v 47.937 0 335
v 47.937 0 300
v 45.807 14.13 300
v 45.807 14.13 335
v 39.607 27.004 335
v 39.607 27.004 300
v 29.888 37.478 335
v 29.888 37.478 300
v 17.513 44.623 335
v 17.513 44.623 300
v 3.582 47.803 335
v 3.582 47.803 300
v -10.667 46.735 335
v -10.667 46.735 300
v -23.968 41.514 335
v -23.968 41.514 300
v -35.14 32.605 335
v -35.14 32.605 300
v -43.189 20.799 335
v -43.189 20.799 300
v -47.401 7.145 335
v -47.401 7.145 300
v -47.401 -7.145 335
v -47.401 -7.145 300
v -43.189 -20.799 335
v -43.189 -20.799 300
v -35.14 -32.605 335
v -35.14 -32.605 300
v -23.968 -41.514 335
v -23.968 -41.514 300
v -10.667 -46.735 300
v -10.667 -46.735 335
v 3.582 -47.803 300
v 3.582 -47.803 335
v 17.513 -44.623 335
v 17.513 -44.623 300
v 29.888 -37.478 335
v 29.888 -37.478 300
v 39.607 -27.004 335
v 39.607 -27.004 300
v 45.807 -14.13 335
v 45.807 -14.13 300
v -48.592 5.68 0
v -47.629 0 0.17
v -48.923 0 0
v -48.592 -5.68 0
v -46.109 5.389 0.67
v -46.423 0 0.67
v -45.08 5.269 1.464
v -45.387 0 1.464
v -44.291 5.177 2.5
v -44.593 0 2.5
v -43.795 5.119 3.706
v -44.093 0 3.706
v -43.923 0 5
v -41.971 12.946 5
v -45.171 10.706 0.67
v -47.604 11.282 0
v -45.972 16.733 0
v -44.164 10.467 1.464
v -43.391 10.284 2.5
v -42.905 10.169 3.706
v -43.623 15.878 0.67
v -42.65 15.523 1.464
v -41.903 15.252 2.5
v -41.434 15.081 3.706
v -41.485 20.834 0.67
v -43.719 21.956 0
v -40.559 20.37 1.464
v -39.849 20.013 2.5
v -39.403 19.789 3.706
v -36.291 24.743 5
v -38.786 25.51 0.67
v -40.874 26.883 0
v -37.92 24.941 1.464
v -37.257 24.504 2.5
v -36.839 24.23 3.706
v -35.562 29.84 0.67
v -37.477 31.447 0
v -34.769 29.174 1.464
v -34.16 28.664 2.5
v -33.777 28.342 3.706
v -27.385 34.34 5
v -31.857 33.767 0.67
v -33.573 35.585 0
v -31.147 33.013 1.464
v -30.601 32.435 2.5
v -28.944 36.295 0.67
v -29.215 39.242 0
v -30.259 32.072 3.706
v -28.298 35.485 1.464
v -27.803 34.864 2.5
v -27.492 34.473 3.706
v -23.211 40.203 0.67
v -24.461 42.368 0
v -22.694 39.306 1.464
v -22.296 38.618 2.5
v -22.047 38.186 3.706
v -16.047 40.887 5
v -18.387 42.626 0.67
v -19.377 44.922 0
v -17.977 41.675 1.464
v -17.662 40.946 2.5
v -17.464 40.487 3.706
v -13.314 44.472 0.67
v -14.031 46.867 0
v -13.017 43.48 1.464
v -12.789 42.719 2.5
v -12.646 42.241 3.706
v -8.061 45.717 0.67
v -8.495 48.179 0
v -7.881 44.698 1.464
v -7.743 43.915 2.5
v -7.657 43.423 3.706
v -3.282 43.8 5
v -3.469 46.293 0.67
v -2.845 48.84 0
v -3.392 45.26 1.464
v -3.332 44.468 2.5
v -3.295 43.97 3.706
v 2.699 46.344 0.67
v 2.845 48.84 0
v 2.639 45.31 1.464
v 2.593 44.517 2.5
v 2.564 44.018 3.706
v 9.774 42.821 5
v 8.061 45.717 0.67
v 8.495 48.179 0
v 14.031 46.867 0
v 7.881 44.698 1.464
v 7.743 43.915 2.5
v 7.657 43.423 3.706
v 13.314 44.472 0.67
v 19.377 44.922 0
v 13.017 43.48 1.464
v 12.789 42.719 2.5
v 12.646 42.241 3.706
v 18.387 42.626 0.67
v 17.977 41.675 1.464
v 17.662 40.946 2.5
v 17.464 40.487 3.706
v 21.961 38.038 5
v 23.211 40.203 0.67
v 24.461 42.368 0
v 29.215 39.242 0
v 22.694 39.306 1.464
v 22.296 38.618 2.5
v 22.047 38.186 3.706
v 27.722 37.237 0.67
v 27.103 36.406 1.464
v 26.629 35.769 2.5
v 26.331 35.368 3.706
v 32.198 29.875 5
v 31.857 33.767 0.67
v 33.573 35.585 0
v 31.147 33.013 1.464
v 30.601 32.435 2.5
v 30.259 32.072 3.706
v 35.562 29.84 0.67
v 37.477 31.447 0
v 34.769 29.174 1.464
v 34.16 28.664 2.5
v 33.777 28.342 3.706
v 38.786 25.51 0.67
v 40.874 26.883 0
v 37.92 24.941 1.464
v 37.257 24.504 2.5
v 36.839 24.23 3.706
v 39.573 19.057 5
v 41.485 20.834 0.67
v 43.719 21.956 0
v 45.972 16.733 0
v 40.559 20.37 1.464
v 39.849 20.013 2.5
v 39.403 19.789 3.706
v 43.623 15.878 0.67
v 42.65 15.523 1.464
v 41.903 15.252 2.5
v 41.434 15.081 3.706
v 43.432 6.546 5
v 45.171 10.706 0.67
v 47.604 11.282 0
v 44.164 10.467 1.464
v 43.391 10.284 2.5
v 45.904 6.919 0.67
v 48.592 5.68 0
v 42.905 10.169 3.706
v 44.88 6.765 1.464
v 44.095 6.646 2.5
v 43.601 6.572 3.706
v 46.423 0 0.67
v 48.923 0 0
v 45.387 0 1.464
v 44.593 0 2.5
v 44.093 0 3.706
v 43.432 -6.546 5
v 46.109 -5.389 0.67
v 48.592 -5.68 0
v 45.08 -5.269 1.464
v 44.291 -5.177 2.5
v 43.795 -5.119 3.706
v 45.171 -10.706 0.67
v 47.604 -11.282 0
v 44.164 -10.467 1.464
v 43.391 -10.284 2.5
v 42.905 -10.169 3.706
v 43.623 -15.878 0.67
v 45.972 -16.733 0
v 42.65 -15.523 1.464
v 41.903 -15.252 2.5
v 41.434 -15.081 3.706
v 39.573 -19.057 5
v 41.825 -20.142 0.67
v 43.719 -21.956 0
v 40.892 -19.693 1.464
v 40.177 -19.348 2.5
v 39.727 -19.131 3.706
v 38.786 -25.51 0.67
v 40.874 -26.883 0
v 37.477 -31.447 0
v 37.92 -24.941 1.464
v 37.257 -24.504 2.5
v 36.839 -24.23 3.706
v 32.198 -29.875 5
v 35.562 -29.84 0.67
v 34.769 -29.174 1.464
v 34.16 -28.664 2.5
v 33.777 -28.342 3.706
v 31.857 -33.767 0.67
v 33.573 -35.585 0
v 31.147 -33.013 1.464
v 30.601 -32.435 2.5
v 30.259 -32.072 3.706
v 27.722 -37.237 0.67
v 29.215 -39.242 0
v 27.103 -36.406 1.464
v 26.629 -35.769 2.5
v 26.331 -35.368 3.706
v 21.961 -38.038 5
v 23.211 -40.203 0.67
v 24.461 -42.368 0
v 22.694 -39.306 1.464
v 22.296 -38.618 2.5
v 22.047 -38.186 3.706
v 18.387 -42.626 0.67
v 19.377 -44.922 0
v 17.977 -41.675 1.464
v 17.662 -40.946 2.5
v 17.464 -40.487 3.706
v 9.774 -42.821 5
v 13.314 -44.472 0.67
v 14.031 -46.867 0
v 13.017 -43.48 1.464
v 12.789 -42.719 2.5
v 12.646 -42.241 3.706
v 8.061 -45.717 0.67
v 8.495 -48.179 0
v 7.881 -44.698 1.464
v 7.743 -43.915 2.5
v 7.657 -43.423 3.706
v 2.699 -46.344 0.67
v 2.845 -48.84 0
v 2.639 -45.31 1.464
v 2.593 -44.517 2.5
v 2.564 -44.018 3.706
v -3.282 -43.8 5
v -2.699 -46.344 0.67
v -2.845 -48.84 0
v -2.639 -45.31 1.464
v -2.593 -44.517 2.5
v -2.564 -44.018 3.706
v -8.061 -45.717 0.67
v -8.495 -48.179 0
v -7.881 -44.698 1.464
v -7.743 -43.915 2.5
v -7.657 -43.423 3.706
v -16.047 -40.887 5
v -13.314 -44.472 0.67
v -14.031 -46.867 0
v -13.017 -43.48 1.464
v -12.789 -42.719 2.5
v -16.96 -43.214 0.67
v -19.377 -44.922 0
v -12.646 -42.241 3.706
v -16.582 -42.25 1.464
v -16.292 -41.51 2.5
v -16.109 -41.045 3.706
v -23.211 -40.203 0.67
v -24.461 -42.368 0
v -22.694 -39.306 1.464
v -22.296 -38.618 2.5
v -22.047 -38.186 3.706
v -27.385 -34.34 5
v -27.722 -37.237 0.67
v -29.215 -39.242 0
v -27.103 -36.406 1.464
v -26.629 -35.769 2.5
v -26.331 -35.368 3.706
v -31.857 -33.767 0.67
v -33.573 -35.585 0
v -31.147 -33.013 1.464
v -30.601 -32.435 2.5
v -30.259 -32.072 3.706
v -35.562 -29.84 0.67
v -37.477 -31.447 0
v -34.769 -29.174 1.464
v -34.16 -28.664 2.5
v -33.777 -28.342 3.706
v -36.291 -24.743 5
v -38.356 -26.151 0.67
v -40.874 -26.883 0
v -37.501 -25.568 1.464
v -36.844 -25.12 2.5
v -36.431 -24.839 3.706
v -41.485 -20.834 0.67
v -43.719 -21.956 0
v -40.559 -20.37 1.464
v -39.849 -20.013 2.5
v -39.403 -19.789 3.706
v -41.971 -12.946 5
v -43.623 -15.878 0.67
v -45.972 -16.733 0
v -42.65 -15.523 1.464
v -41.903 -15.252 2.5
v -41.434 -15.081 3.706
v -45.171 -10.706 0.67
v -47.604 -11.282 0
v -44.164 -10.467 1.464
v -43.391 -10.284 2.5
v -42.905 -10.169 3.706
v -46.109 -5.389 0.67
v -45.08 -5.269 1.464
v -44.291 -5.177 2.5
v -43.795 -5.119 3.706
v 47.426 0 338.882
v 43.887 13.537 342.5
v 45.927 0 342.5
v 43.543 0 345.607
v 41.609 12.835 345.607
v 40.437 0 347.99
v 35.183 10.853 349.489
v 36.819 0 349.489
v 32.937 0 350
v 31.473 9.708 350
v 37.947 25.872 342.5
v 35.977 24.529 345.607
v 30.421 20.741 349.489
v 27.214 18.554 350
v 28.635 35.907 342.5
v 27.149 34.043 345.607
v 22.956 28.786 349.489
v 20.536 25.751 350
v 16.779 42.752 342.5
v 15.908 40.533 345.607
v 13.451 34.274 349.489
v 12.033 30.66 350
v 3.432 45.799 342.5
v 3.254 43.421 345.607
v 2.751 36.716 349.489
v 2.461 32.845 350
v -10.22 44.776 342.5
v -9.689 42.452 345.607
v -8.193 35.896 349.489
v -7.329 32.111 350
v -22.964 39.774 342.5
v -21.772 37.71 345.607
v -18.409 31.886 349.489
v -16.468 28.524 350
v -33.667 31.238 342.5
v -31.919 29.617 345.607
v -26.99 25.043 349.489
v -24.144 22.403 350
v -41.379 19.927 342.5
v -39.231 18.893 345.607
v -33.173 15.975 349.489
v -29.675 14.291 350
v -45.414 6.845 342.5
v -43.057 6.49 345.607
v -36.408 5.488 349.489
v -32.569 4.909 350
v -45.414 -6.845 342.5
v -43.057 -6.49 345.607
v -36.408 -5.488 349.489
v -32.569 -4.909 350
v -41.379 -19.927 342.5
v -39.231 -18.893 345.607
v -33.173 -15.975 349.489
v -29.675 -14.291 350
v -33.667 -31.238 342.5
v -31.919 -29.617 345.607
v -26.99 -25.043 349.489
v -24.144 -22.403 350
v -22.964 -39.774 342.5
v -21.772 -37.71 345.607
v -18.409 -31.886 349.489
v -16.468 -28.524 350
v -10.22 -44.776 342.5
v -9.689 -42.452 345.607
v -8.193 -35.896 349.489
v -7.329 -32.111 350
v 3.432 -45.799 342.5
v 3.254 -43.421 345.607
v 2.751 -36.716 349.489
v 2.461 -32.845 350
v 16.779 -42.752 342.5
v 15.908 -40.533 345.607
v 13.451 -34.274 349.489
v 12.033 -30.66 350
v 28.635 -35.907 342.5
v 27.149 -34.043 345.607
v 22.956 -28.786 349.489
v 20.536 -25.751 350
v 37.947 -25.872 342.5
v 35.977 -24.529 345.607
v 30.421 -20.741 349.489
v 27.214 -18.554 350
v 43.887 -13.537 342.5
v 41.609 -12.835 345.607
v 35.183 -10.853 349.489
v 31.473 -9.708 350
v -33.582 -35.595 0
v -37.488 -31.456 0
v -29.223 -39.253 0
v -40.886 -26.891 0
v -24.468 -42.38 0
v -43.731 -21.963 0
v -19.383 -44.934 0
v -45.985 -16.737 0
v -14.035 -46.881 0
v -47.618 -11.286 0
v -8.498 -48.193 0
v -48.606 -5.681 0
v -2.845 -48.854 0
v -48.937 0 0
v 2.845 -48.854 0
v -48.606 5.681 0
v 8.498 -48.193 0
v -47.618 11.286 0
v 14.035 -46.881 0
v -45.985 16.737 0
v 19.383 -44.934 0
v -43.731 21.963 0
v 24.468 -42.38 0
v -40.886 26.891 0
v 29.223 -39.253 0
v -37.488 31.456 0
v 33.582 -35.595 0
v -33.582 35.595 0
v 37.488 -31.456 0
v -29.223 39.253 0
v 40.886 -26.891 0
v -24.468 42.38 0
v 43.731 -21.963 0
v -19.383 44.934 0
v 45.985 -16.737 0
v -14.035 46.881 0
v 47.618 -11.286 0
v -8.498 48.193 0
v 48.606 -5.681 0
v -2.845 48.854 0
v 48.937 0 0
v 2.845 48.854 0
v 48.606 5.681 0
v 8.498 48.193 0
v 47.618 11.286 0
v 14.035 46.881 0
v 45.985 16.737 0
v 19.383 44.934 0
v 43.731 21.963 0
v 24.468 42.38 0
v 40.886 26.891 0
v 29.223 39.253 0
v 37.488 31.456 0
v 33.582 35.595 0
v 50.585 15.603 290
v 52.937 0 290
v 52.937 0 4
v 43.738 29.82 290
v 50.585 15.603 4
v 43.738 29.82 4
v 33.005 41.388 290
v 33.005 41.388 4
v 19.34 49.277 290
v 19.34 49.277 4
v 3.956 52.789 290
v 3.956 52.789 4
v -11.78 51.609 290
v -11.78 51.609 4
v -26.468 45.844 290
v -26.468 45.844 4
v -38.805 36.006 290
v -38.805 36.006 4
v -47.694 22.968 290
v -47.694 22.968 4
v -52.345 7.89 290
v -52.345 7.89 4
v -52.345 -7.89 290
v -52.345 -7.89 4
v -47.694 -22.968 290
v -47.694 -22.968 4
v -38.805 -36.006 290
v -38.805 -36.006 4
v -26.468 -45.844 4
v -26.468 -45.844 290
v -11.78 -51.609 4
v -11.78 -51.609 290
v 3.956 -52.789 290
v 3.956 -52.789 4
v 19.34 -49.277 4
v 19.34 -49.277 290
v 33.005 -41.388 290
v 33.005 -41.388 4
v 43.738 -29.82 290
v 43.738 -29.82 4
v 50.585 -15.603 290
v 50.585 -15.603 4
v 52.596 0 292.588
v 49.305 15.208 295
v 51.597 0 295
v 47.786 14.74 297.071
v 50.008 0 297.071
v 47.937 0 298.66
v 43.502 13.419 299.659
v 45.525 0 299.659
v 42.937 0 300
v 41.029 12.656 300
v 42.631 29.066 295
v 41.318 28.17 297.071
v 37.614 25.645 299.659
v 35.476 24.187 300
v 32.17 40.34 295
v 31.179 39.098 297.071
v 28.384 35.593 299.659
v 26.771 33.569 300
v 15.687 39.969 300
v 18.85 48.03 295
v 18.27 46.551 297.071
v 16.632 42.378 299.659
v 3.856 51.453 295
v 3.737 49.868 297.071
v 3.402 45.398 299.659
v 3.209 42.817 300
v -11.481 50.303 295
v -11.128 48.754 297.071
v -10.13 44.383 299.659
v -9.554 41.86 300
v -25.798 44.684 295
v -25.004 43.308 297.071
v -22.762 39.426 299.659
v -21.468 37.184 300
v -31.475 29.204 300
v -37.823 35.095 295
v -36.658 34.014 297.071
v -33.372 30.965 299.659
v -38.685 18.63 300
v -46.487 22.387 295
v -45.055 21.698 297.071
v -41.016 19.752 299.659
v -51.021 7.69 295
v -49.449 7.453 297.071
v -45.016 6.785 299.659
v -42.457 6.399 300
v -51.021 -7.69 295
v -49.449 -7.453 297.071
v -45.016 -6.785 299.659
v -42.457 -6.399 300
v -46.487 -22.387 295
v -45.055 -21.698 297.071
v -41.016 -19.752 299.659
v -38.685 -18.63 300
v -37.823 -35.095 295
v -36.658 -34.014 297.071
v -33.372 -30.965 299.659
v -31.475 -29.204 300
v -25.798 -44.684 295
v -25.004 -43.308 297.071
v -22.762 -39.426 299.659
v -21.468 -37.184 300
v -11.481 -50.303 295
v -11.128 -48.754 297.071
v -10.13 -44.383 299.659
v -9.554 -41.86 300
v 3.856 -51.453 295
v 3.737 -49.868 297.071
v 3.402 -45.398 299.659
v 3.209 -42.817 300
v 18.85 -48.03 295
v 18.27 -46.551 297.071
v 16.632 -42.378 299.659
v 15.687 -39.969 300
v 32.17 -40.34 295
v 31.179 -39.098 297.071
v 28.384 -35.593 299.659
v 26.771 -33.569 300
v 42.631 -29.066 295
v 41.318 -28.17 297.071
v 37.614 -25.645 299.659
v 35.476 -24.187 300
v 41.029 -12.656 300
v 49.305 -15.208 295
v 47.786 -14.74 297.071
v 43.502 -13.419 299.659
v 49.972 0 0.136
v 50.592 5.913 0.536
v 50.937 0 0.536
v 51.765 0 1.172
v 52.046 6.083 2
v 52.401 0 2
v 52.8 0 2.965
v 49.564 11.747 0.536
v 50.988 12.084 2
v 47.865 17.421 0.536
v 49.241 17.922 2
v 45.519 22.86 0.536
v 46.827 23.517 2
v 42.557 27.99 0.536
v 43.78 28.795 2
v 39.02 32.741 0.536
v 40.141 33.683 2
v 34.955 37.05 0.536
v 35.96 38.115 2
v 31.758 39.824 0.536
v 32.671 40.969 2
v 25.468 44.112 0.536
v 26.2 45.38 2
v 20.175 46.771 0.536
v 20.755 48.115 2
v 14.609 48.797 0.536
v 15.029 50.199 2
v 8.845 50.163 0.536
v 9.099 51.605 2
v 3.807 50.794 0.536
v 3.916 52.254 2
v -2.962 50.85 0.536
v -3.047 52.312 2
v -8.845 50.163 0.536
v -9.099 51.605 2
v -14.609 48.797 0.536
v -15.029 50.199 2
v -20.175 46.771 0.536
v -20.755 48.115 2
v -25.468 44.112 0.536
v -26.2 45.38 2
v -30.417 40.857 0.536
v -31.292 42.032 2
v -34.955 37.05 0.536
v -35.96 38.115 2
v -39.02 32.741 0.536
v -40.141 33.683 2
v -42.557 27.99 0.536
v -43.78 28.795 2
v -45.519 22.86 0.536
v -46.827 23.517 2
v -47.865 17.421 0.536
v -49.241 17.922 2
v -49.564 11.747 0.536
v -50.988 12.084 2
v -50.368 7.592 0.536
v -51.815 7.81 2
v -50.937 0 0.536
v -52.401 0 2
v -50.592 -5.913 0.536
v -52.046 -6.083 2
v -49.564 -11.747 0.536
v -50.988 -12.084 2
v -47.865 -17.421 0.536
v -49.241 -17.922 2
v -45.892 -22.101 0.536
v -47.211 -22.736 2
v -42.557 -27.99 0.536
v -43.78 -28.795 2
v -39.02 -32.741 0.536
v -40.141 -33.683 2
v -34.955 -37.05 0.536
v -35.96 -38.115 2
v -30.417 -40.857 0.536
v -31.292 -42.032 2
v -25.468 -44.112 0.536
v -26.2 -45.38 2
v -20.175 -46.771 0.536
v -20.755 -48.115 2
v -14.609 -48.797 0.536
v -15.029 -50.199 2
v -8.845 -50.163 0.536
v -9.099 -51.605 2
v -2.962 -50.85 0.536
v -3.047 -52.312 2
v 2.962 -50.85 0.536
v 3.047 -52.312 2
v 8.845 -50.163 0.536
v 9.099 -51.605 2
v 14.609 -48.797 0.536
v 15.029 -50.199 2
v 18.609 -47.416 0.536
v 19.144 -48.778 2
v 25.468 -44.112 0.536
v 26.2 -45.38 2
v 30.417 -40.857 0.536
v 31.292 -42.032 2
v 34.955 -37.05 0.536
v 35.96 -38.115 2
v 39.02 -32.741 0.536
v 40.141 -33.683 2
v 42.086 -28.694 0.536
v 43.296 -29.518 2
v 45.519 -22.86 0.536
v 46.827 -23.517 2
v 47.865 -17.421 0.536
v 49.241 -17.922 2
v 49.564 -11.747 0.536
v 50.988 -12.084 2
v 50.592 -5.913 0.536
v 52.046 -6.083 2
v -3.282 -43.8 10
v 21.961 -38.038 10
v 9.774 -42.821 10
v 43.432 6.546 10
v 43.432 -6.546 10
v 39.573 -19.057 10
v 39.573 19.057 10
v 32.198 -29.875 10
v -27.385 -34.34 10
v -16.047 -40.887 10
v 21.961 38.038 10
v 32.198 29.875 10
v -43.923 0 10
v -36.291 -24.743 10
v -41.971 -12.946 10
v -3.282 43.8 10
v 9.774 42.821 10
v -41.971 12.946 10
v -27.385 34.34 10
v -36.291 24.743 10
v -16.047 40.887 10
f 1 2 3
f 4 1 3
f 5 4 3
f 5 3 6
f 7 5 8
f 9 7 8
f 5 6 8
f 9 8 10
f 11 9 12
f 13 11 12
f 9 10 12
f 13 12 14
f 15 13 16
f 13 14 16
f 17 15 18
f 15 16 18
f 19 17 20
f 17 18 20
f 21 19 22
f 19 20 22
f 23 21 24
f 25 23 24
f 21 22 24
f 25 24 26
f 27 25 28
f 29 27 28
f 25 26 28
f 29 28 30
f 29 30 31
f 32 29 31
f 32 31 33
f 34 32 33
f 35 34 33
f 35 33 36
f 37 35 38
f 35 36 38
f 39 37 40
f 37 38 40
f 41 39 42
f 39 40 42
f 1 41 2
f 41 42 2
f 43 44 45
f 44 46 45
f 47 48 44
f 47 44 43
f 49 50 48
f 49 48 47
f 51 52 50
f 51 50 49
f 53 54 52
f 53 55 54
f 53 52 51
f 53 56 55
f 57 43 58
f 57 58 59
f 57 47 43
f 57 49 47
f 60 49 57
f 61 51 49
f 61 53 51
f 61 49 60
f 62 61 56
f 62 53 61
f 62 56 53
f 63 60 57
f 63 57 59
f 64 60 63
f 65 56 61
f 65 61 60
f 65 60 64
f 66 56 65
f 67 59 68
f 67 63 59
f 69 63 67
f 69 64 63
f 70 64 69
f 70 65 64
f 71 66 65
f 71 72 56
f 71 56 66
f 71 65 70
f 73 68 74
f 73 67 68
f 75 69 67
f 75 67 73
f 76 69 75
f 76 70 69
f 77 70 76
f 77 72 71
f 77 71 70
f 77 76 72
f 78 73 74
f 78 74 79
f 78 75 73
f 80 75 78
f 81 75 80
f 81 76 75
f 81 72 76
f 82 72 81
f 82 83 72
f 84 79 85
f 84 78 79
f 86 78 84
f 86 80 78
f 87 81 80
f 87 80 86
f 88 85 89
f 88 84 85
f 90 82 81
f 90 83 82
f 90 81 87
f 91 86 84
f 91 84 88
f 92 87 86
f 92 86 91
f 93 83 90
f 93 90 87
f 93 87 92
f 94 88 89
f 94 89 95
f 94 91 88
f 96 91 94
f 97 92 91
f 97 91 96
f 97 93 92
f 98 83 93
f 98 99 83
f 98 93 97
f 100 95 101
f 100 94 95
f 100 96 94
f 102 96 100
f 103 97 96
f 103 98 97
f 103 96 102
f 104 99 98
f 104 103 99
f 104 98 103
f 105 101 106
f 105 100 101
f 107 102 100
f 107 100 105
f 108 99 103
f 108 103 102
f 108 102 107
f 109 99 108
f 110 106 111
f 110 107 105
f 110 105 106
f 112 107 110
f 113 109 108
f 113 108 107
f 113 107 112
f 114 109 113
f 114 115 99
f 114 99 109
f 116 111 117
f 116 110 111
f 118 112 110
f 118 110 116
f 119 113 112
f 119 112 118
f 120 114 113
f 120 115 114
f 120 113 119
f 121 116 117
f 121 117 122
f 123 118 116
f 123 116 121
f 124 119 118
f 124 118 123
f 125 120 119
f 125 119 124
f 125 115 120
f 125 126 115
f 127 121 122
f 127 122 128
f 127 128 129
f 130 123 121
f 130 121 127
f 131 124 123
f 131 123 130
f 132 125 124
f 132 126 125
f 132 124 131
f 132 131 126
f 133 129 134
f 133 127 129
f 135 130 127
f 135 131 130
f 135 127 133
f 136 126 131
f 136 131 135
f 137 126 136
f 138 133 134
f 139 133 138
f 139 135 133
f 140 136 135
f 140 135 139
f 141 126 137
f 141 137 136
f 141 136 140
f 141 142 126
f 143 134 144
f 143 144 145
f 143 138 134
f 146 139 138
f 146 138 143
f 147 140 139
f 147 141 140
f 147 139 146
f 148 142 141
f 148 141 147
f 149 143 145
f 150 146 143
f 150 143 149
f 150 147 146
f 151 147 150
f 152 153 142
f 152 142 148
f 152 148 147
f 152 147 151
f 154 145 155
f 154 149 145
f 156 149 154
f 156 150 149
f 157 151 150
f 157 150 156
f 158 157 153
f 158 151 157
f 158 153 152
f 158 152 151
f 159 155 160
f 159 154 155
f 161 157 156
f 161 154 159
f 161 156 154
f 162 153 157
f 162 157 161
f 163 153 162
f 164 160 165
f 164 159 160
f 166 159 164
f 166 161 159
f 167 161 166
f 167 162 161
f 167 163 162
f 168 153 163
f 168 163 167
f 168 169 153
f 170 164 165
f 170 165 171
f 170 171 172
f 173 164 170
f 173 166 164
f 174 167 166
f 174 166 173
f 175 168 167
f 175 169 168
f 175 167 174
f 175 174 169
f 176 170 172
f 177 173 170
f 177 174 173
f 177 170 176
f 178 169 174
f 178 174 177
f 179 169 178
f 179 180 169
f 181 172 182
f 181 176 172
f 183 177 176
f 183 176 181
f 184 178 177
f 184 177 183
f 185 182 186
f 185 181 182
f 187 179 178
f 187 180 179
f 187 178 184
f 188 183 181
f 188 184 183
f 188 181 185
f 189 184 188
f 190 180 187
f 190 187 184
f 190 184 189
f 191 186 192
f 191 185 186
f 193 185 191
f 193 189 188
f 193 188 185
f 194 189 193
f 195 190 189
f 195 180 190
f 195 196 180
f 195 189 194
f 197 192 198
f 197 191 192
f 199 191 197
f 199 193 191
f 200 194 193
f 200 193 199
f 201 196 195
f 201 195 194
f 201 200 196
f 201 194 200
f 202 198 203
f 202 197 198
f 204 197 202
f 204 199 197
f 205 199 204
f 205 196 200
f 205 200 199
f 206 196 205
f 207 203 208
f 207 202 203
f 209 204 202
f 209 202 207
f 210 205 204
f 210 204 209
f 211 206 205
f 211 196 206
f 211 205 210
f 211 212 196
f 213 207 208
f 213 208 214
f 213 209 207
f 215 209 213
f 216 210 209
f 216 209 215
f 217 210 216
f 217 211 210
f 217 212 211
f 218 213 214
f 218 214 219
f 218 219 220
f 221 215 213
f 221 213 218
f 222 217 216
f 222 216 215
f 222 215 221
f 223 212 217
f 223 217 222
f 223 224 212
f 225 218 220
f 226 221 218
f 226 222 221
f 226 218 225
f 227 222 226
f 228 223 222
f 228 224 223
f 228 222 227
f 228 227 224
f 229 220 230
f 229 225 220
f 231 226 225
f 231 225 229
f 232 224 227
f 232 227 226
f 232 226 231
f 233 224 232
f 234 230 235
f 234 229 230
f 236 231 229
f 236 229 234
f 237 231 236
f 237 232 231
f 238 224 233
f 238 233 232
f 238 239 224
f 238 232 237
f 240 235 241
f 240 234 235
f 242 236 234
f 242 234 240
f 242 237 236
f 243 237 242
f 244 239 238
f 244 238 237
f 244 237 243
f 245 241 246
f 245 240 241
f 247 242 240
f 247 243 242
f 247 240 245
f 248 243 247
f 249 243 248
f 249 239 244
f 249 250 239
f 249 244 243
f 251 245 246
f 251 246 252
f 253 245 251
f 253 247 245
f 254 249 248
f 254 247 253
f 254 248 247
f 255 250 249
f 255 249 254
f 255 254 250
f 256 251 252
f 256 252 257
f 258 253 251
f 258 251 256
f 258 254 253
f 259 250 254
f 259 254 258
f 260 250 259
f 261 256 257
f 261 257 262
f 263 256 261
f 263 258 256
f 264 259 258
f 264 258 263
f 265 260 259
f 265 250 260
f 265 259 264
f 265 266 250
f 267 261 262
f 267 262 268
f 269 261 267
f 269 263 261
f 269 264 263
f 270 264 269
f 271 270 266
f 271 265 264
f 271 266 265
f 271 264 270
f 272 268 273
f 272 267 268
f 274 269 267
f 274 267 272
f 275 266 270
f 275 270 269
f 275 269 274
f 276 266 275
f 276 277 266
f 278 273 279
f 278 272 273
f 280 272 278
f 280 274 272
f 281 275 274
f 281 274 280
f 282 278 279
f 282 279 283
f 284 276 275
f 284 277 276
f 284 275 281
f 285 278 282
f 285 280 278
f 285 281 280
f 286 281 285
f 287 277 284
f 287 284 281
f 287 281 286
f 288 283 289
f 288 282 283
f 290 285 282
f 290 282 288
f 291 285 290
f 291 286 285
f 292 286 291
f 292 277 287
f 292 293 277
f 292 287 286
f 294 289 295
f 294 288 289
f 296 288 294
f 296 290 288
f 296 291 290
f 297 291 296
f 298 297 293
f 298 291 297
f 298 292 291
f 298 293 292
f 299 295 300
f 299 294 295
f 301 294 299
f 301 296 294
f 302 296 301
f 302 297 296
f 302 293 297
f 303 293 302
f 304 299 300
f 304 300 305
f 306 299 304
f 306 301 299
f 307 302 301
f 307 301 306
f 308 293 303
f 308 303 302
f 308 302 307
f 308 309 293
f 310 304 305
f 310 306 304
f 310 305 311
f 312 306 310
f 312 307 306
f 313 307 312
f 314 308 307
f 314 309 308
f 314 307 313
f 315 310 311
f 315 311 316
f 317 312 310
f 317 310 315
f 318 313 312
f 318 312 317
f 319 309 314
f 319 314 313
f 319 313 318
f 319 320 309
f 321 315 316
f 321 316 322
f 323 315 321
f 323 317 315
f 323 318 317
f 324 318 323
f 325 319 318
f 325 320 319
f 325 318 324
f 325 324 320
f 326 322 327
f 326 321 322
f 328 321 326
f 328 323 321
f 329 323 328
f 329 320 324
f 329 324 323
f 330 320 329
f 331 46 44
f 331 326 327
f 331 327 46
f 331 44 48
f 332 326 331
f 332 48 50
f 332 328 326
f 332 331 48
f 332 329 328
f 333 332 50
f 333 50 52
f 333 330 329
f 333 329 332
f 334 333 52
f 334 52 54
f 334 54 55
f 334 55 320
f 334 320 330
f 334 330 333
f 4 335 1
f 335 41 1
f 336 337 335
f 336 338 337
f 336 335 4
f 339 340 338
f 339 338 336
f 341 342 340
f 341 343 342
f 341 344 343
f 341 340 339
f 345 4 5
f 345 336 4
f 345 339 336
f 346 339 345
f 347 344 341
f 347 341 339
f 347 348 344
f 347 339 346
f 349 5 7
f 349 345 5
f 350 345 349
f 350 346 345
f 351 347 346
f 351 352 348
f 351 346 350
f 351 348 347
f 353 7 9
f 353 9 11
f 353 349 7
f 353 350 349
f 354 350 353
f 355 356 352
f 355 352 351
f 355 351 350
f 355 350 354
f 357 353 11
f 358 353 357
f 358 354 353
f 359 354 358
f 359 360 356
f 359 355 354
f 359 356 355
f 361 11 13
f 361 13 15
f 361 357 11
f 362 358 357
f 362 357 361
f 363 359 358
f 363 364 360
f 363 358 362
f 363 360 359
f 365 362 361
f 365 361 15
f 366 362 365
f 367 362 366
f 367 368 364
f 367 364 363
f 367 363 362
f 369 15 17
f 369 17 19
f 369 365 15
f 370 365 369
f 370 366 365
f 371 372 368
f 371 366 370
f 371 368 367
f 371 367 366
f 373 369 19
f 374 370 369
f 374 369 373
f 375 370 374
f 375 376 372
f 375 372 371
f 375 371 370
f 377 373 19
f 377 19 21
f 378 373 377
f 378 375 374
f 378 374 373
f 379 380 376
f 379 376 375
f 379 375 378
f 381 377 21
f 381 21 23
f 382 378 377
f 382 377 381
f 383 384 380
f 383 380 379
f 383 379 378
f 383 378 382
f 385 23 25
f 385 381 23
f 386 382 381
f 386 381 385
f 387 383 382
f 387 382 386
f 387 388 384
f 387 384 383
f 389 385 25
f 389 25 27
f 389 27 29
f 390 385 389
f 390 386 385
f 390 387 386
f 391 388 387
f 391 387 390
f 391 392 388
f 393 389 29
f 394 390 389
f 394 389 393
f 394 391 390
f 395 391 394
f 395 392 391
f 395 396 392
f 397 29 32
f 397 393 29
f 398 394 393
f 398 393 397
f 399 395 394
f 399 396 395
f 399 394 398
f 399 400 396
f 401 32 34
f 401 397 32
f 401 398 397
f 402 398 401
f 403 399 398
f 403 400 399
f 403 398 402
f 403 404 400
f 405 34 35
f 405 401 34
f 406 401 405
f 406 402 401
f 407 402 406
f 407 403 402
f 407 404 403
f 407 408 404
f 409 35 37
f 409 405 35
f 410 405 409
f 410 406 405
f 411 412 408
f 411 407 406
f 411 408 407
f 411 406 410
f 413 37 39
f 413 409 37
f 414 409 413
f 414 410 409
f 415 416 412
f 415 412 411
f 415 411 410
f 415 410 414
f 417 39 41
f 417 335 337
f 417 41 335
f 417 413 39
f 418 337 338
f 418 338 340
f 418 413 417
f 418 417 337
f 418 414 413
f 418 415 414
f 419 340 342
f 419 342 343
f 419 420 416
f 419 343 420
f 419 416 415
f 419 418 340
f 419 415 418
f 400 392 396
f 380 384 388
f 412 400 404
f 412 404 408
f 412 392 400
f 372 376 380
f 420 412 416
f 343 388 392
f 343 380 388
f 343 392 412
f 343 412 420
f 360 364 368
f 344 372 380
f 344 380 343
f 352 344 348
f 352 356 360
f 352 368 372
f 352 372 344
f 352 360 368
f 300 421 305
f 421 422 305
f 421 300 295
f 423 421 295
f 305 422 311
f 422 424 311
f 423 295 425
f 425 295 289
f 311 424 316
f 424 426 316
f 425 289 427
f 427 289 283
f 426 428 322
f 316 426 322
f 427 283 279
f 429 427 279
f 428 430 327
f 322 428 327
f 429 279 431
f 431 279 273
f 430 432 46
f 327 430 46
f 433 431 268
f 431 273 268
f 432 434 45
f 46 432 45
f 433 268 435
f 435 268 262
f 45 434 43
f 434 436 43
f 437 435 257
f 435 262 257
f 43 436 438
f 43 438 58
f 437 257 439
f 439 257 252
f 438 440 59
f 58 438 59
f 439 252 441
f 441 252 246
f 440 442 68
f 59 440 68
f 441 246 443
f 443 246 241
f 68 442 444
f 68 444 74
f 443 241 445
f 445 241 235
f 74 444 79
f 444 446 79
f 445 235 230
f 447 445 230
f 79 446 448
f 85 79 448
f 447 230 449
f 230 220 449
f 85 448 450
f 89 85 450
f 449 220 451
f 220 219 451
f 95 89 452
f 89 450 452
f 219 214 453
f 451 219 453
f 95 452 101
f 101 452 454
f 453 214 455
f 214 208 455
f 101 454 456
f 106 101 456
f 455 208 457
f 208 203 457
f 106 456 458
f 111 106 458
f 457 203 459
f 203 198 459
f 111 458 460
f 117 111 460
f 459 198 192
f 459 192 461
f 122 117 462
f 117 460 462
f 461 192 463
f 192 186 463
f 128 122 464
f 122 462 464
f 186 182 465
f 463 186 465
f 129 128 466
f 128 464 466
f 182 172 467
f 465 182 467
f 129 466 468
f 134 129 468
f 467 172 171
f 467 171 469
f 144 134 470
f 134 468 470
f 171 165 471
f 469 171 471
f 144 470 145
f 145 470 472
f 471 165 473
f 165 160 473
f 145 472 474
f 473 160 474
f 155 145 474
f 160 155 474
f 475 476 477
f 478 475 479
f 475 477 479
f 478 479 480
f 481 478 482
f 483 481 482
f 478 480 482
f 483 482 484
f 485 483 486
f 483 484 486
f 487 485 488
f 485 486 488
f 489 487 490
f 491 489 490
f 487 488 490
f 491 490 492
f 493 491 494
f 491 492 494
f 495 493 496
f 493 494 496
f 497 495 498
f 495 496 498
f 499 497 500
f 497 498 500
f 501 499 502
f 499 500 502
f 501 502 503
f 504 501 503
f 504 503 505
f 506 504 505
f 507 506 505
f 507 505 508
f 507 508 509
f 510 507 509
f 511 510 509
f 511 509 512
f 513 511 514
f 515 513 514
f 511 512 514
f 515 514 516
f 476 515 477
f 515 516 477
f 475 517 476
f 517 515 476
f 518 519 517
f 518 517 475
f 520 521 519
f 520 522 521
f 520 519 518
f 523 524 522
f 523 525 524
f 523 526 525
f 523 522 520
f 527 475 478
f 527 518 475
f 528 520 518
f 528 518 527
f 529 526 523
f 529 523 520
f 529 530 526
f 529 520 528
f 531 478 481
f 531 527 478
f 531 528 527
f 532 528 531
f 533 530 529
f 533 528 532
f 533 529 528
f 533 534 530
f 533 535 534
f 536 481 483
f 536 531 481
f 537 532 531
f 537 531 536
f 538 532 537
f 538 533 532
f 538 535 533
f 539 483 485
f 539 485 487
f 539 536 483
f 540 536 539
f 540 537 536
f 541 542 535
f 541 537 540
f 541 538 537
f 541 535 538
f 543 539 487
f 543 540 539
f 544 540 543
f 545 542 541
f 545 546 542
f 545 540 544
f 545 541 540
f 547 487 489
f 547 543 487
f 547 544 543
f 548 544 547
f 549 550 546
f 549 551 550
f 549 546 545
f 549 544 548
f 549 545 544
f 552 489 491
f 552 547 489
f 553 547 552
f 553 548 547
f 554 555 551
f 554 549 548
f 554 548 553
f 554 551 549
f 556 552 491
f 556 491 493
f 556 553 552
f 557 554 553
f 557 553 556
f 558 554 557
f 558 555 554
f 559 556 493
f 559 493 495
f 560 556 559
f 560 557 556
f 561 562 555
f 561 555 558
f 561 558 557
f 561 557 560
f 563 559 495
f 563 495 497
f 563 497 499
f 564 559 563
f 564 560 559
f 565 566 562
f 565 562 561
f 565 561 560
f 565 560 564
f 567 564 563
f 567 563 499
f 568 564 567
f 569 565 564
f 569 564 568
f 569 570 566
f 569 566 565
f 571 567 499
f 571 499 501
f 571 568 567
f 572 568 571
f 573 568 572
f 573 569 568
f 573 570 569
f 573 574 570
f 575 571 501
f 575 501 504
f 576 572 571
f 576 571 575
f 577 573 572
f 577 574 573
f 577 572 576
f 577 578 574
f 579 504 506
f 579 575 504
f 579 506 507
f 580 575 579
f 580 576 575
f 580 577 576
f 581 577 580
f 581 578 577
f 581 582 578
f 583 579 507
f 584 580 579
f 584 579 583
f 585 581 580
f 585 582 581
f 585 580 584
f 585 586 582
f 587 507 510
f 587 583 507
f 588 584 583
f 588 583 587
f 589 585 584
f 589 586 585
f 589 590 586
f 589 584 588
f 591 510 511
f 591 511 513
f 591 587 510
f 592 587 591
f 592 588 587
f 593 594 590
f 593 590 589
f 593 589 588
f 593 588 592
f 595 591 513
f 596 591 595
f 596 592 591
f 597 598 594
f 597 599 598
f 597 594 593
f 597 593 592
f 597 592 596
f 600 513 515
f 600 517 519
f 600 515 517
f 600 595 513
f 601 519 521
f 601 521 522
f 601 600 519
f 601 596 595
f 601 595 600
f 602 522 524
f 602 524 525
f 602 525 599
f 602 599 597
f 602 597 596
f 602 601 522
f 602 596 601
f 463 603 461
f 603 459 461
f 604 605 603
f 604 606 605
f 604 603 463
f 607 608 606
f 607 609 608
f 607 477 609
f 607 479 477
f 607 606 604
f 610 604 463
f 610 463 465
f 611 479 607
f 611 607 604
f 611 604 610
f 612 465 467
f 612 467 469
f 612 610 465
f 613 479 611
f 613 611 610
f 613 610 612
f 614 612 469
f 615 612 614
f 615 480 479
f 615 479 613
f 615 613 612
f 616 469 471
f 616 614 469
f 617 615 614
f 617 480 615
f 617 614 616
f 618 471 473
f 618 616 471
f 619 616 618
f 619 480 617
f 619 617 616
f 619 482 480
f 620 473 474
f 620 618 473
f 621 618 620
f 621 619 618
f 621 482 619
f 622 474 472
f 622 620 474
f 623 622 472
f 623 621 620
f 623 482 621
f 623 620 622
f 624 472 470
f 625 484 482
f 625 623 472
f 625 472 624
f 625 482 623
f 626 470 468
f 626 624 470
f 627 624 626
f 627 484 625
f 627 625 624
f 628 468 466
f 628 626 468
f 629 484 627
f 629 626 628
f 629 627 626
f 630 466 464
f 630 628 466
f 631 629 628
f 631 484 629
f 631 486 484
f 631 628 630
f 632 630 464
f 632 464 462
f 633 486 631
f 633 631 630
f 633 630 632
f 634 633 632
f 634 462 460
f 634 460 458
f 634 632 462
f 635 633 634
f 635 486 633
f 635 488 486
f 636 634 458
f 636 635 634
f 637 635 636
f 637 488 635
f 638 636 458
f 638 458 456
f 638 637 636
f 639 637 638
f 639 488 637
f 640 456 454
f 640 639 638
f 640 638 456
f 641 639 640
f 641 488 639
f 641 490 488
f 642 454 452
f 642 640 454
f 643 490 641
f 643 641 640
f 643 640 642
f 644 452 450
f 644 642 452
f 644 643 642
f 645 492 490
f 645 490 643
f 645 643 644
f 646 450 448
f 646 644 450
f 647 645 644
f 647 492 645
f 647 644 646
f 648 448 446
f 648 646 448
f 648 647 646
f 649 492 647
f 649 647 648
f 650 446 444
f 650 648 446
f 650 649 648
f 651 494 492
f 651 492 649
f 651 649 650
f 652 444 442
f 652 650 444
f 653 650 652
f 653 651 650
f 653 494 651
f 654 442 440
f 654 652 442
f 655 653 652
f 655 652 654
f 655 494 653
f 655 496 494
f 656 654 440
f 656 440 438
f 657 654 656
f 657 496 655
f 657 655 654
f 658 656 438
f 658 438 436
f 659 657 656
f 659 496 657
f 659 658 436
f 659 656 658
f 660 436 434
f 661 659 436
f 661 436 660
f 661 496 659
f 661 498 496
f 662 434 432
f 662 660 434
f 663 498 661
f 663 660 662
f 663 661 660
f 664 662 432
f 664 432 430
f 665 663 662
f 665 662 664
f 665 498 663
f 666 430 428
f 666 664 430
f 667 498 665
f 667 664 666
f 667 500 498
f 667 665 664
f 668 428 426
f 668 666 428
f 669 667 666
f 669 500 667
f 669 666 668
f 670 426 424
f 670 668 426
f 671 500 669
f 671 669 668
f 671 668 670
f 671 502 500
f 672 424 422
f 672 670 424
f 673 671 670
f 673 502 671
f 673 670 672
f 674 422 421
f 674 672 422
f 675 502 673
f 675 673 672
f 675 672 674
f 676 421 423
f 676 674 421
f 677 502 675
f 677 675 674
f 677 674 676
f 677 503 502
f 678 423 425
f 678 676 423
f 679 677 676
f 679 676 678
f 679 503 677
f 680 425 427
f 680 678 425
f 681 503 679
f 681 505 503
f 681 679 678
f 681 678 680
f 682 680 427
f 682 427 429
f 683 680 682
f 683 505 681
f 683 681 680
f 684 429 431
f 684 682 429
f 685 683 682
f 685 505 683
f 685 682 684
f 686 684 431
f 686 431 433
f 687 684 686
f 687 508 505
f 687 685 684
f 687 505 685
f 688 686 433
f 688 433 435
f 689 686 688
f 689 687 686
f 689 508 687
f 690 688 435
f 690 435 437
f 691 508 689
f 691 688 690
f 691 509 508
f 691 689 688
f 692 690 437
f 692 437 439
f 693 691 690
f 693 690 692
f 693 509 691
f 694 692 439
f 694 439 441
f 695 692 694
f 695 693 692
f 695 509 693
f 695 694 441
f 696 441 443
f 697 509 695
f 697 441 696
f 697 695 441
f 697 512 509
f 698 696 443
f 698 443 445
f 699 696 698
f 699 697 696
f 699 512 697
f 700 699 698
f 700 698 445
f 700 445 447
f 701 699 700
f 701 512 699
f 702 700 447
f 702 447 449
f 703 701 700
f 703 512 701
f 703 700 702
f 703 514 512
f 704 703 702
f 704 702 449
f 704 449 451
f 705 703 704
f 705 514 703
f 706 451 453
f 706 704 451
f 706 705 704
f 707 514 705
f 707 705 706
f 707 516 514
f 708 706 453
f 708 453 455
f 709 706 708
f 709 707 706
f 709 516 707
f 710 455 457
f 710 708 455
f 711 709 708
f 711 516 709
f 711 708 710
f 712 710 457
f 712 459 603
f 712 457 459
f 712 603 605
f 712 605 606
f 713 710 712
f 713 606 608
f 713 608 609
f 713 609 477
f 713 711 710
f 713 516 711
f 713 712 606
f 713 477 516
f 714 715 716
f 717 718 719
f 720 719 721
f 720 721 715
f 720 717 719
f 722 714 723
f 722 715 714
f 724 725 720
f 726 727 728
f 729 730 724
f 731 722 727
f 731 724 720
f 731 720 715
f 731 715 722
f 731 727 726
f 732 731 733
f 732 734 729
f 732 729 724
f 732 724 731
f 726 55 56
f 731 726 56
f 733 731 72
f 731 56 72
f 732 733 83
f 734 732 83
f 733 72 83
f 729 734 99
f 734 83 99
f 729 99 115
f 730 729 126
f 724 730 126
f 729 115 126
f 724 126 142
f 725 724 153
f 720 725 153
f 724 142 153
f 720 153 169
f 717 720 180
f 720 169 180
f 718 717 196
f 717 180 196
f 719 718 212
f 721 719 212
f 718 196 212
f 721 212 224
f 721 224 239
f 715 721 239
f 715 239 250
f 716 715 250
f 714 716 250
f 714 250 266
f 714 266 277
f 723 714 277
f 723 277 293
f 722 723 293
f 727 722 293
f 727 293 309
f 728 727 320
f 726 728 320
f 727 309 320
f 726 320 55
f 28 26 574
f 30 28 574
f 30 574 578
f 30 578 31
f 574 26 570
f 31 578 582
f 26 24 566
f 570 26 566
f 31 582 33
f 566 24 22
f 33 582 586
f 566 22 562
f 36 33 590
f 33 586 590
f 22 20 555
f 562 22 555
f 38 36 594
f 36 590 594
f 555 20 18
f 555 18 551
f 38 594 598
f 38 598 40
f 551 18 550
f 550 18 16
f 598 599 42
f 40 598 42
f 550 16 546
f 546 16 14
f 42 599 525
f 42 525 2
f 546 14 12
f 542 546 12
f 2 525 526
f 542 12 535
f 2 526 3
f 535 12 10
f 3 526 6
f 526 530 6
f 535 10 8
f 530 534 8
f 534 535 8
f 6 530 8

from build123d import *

# Parameters (mm, degrees)
SKETCH1_R           = 52.936641772
BOSS_EXTRUDE1_DEPTH = 300
FILLET1_R           = 10
SKETCH2_R           = 47.936641772
BOSS_EXTRUDE2_DEPTH = 50
FILLET2_R           = 15
SKETCH3_R           = 43.922720163
CUT_EXTRUDE1_DEPTH  = 10
FILLET3_R           = 5
FILLET4_R           = 4


with BuildPart() as part:
    # Sketch1 → Boss-Extrude1 (new body)
    with BuildSketch(Plane.XY):
        Circle(SKETCH1_R)
    extrude(amount=BOSS_EXTRUDE1_DEPTH)

    # Fillet1
    fillet1_edges = [part.edges().sort_by_distance(p)[0] for p in [
        (-52.936641772, 0, 300),
    ]]
    fillet(fillet1_edges, radius=FILLET1_R)

    # Sketch2 → Boss-Extrude2 (add)
    with BuildSketch(Plane.XY.offset(300)):
        Circle(SKETCH2_R)
    extrude(amount=BOSS_EXTRUDE2_DEPTH)

    # Fillet2
    fillet2_edges = [part.edges().sort_by_distance(p)[0] for p in [
        (-47.936641772, 0, 350),
    ]]
    fillet(fillet2_edges, radius=FILLET2_R)

    # Sketch3 → Cut-Extrude1 (cut)
    with BuildSketch(Plane(origin=(0, 0, 0), x_dir=(-1, 0, 0), z_dir=(0, 0, -1))):
        Circle(SKETCH3_R)
    extrude(amount=-CUT_EXTRUDE1_DEPTH, mode=Mode.SUBTRACT)

    # Fillet3
    fillet3_edges = [part.edges().sort_by_distance(p)[0] for p in [
        (43.922720163, 0, 0),
    ]]
    fillet(fillet3_edges, radius=FILLET3_R)

    # Fillet4
    fillet4_edges = [part.edges().sort_by_distance(p)[0] for p in [
        (-52.936641772, 0, 0),
    ]]
    fillet(fillet4_edges, radius=FILLET4_R)


solid = part.part
